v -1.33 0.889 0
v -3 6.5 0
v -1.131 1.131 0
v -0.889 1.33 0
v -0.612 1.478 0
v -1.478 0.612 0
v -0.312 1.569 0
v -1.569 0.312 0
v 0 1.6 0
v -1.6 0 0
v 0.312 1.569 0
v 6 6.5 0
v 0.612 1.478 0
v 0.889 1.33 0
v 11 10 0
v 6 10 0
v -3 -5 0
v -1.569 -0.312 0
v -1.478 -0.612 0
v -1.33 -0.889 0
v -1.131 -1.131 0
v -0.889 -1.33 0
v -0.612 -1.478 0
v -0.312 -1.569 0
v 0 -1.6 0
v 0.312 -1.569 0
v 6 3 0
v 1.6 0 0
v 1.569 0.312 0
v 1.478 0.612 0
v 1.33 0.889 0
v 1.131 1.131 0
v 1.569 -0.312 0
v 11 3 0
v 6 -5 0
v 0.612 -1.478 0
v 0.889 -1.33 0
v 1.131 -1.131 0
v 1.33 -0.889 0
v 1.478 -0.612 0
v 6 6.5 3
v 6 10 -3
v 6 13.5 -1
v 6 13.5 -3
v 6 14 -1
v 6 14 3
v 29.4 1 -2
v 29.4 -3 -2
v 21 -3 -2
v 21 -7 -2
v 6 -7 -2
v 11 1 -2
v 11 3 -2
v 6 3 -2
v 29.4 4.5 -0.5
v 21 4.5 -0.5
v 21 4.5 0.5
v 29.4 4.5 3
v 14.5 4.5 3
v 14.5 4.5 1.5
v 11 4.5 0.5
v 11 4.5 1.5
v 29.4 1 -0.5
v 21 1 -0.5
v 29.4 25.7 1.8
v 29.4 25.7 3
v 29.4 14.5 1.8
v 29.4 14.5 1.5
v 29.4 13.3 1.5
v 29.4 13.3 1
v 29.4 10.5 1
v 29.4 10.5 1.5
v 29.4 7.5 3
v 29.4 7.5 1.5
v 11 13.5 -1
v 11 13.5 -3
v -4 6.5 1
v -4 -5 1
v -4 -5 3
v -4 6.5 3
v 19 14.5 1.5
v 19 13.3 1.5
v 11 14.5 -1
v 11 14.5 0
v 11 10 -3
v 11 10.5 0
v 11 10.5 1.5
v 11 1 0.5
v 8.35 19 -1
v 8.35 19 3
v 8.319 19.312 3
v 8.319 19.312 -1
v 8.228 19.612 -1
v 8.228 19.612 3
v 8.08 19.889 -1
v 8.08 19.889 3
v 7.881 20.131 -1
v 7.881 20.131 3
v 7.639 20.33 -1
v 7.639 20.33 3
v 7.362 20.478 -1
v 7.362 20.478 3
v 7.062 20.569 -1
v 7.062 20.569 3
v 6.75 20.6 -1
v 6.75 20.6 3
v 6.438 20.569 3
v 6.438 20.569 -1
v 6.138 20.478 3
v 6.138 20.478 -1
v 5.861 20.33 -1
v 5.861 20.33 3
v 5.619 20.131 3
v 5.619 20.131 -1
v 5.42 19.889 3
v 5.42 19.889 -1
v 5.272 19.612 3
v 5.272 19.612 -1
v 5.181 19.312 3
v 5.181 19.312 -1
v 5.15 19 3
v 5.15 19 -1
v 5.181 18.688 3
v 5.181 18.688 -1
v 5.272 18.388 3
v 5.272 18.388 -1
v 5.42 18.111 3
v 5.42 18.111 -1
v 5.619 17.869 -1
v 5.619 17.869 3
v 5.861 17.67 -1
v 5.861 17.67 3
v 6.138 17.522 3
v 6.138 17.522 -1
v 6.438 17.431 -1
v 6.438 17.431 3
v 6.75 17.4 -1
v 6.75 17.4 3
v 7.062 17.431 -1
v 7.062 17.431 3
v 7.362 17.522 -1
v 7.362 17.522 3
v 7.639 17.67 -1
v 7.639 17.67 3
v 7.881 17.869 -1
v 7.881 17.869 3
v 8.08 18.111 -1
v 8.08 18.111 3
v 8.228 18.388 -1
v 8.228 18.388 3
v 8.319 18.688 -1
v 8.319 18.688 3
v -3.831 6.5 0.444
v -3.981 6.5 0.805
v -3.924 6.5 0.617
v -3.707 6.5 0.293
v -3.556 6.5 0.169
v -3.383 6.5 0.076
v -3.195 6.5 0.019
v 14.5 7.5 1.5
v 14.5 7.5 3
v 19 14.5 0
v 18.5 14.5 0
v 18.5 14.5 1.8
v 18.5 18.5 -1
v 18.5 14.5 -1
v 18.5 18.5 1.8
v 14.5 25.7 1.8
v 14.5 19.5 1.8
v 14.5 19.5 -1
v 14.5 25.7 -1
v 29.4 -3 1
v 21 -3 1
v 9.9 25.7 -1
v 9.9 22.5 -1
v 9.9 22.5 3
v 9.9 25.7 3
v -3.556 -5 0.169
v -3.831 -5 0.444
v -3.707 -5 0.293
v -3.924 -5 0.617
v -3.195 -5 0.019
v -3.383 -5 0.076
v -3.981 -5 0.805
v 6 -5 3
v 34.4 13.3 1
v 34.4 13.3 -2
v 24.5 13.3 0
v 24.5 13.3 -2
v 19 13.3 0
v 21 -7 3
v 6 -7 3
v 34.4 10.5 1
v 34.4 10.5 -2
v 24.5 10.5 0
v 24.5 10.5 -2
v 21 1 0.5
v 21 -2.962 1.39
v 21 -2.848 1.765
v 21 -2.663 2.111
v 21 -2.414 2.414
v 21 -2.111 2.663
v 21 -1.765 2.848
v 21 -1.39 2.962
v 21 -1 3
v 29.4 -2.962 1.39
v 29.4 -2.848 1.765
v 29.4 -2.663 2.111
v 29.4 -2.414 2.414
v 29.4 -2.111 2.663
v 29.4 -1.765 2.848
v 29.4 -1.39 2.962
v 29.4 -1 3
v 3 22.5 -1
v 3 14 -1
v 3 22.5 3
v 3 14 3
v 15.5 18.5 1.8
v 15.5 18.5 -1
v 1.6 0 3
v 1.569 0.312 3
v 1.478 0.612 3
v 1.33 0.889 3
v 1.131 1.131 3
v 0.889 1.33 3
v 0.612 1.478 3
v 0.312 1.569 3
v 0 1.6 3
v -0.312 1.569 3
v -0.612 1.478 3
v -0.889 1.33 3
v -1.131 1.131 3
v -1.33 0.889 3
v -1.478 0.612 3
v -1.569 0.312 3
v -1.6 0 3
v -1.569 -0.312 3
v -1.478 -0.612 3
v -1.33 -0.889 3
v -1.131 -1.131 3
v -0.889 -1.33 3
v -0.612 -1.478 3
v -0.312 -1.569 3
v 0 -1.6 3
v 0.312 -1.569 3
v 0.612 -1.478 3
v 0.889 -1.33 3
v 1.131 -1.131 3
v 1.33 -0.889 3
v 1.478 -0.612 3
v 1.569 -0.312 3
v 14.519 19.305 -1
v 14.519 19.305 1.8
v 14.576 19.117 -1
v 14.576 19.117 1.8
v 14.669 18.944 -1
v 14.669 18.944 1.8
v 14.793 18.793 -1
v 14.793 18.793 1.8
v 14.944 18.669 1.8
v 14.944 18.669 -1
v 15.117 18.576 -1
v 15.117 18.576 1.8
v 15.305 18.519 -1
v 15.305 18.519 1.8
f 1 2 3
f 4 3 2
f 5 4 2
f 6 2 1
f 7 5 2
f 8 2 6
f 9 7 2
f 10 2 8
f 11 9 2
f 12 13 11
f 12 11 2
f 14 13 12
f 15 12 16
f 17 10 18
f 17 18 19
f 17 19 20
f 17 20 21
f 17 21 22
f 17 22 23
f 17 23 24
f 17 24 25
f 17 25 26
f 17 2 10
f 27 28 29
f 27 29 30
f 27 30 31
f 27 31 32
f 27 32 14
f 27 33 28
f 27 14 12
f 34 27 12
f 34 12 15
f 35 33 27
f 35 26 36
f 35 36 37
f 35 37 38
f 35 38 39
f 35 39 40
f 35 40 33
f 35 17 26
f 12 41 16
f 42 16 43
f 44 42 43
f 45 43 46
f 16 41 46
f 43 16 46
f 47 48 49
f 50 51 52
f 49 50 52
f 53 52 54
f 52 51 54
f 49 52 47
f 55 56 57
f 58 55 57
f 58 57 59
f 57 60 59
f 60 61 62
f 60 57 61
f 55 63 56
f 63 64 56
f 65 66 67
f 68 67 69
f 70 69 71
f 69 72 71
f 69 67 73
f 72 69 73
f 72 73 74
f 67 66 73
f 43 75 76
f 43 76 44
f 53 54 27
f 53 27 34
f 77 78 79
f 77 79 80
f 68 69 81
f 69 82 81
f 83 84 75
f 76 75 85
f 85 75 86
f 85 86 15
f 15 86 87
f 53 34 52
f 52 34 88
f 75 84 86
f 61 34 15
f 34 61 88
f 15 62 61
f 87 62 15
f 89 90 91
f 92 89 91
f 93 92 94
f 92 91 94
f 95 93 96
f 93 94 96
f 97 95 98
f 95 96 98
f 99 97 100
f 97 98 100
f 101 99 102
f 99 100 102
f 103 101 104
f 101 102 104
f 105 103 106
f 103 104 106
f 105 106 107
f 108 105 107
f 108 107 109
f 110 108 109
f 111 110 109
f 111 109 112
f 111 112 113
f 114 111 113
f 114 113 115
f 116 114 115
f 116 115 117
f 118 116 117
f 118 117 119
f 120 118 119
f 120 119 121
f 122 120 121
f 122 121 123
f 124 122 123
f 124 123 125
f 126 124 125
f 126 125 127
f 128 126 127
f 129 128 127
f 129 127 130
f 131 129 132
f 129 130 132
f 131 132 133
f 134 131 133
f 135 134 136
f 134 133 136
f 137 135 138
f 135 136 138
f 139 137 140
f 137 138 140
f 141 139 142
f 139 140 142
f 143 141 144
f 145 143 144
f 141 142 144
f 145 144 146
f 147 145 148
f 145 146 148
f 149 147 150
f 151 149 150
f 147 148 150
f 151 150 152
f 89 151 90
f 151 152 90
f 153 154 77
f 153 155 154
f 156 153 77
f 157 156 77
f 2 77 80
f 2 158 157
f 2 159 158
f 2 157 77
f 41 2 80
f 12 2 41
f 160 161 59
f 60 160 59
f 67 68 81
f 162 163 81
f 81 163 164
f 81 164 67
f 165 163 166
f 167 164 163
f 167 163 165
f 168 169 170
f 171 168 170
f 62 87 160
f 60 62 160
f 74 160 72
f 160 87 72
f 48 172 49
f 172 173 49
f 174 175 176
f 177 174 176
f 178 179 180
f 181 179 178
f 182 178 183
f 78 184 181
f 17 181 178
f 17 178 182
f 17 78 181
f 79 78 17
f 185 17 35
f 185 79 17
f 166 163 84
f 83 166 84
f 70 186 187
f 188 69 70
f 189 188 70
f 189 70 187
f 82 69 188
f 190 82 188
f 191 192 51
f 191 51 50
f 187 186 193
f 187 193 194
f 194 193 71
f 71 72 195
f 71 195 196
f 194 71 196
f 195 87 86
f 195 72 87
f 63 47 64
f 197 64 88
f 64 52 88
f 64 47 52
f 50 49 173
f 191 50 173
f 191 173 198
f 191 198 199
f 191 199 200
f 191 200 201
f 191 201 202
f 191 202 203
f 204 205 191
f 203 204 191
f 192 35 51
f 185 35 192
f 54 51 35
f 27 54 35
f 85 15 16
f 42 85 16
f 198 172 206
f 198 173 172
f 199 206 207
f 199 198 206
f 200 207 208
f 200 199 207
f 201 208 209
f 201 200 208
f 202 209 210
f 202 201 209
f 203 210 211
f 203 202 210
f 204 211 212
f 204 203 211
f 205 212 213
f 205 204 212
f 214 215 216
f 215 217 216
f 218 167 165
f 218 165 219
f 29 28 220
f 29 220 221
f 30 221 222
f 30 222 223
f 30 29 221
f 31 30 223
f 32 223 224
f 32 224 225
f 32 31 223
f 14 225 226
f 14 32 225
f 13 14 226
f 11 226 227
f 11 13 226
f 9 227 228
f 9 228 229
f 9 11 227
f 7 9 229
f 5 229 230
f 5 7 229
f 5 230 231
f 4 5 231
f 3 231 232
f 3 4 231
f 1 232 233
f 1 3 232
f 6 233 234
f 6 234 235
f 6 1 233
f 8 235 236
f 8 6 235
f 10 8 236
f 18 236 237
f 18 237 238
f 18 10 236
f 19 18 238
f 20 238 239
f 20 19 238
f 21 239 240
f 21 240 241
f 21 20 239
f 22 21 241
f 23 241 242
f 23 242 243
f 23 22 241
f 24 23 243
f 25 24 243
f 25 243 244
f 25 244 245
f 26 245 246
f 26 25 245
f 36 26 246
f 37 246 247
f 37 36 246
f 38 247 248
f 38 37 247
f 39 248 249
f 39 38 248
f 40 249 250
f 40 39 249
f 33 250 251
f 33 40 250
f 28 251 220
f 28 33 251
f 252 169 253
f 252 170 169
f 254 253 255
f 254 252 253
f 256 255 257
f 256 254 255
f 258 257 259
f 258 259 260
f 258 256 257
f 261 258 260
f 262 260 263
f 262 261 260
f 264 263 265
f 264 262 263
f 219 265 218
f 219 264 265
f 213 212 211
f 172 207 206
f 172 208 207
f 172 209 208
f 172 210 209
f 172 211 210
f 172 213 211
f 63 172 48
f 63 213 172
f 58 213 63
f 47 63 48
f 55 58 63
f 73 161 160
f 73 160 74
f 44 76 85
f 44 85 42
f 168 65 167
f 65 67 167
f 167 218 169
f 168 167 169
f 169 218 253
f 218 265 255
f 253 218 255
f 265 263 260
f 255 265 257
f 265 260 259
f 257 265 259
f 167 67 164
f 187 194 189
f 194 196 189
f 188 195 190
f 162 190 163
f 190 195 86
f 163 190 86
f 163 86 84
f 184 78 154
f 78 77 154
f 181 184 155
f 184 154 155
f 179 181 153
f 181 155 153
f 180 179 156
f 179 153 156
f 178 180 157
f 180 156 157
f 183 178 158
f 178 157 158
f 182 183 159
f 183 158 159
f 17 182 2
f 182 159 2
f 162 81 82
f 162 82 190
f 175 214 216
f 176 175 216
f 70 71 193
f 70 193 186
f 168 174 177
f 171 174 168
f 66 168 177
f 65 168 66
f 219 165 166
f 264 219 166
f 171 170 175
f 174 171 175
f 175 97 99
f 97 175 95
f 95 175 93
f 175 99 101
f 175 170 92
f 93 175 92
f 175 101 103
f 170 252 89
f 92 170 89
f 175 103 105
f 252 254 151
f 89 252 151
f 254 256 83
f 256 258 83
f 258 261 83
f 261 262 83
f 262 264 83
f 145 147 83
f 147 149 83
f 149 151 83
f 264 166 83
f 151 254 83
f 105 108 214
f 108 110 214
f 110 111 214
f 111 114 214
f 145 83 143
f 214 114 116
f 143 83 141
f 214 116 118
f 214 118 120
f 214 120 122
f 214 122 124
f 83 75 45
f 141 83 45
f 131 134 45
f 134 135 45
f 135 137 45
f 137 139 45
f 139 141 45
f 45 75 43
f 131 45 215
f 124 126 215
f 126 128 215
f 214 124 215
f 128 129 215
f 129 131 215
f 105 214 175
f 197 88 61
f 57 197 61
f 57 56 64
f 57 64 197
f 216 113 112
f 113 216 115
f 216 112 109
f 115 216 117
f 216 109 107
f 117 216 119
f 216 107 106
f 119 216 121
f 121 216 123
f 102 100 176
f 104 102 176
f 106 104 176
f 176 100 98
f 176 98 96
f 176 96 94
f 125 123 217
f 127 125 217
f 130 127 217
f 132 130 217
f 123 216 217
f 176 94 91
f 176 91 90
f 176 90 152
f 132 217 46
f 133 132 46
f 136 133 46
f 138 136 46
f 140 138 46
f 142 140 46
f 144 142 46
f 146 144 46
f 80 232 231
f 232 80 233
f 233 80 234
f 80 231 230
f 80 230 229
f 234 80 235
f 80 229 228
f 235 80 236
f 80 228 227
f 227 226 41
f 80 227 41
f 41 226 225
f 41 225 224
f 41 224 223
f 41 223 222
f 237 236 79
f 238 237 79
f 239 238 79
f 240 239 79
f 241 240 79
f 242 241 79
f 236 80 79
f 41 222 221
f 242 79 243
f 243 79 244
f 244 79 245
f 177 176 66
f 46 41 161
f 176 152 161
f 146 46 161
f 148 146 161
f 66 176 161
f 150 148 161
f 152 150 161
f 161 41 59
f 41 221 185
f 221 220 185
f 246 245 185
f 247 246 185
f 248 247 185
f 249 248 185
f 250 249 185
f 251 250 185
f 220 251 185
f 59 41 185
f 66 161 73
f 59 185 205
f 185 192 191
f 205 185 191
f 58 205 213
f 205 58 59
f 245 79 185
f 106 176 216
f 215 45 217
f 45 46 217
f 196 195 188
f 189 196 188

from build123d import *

# Parameters (mm, degrees)
SKETCH_1_W          = 10
SKETCH_1_H          = 11.5
SKETCH_1_R          = 1.6
EXTRUDE_1_DEPTH     = 3
SKETCH_2_W          = 15
SKETCH_2_H          = 6
EXTRUDE_2_DEPTH     = 5
FILLET_1_R          = 1
SKETCH_3_W          = 5
SKETCH_3_H          = 5
EXTRUDE_3_DEPTH     = 2
SKETCH_4_W          = 5
SKETCH_4_H          = 3
EXTRUDE_4_DEPTH     = 19.5
SKETCH_5_W          = 5
SKETCH_5_H          = 3.5
EXTRUDE_5_DEPTH     = 3
SKETCH_6_W          = 3
SKETCH_6_H          = 8.5
EXTRUDE_6_DEPTH     = 3
EXTRUDE_7_DEPTH     = 1
SKETCH_8_W          = 3.5
SKETCH_8_H          = 21.5
EXTRUDE_8_DEPTH     = 1
SKETCH_9_W          = 3
SKETCH_9_H          = 8
EXTRUDE_9_DEPTH     = 3.5
EXTRUDE_10_REACH    = 29.208
SKETCH_10_W         = 2.5
SKETCH_10_H         = 3.5
EXTRUDE_11_REACH    = 29.208
SKETCH_11_W         = 3
SKETCH_11_H         = 4
SKETCH_12_W         = 1.5
SKETCH_12_H         = 1.2
CUT_EXTRUDE_1_DEPTH = 2
SKETCH_13_W         = 1
SKETCH_13_H         = 2.5
EXTRUDE_12_DEPTH    = 6.5
SKETCH_14_W         = 1.2
SKETCH_14_H         = 8
EXTRUDE_13_DEPTH    = 6.5
SKETCH_15_W         = 4
SKETCH_15_H         = 4
EXTRUDE_14_DEPTH    = 2.8
FILLET_2_R          = 1
CUT_EXTRUDE_2_REACH = 33.357
SKETCH_16_R         = 1.6
SKETCH_17_W         = 15
SKETCH_17_H         = 5
EXTRUDE_15_DEPTH    = 2
EXTRUDE_16_DEPTH    = 5.5
SKETCH_19_W         = 2
SKETCH_19_H         = 2.8
EXTRUDE_17_DEPTH    = 2
EXTRUDE_18_DEPTH    = 5.5
EXTRUDE_19_DEPTH    = 2.9
EXTRUDE_20_DEPTH    = 0.5
FILLET_3_R          = 2
SKETCH_23_W         = 14.9
SKETCH_23_H         = 1.5
EXTRUDE_21_DEPTH    = 0.5
SKETCH_24_W         = 3
SKETCH_24_H         = 2.8
EXTRUDE_22_DEPTH    = 5
EXTRUDE_23_DEPTH    = 3.2


with BuildPart() as part:
    # 草图1 → 凸台-拉伸1 (new body)
    with BuildSketch(Plane.XY):
        with Locations((1, 0.75)):
            Rectangle(SKETCH_1_W, SKETCH_1_H)
        Circle(SKETCH_1_R, mode=Mode.SUBTRACT)
    extrude(amount=EXTRUDE_1_DEPTH)

    # 草图2 → 凸台-拉伸2 (add)
    with BuildSketch(Plane.XY.offset(3)):
        with Locations((13.5, -2)):
            Rectangle(SKETCH_2_W, SKETCH_2_H)
    extrude(amount=-EXTRUDE_2_DEPTH)

    # 圆角1
    fillet_1_edges = [part.edges().sort_by_distance(p)[0] for p in [
        (-4, 0.75, 0),
    ]]
    fillet(fillet_1_edges, radius=FILLET_1_R)

    # 草图3 → 凸台-拉伸3 (add)
    with BuildSketch(Plane(origin=(0, 1, 0), x_dir=(1, 0, 0), z_dir=(0, 1, 0))):
        with Locations((8.5, -0.5)):
            Rectangle(SKETCH_3_W, SKETCH_3_H)
    extrude(amount=EXTRUDE_3_DEPTH)

    # 草图4 → 凸台-拉伸4 (add)
    with BuildSketch(Plane(origin=(0, 3, 0), x_dir=(1, 0, 0), z_dir=(0, 1, 0))):
        with Locations((8.5, -1.5)):
            Rectangle(SKETCH_4_W, SKETCH_4_H)
    extrude(amount=EXTRUDE_4_DEPTH)

    # 草图5 → 凸台-拉伸5 (add)
    with BuildSketch(Plane(origin=(0, 0, 0), x_dir=(-1, 0, 0), z_dir=(0, 0, -1))):
        with Locations((-8.5, 11.75)):
            Rectangle(SKETCH_5_W, SKETCH_5_H)
    extrude(amount=EXTRUDE_5_DEPTH)

    # 草图6 → 凸台-拉伸6 (add)
    with BuildSketch(Plane.ZY.offset(-6)):
        with Locations((1.5, 18.25)):
            Rectangle(SKETCH_6_W, SKETCH_6_H)
    extrude(amount=EXTRUDE_6_DEPTH)

    # 草图7 → 凸台-拉伸7 (add)
    with BuildSketch(Plane(origin=(0, 0, 0), x_dir=(-1, 0, 0), z_dir=(0, 0, -1))):
        Polygon((-11, 13.5), (-6, 13.5), (-6, 14), (-3, 14), (-3, 22.5), (-11, 22.5), align=None)
    extrude(amount=EXTRUDE_7_DEPTH)

    # 草图8 → 凸台-拉伸8 (add)
    with BuildSketch(Plane.XY.offset(3)):
        with Locations((12.75, 11.75)):
            Rectangle(SKETCH_8_W, SKETCH_8_H)
    extrude(amount=-EXTRUDE_8_DEPTH)

    # 草图9 → 凸台-拉伸9 (add)
    with BuildSketch(Plane(origin=(11, 0, 0), x_dir=(0, 0, -1), z_dir=(1, 0, 0))):
        with Locations((-0.5, 18.5)):
            Rectangle(SKETCH_9_W, SKETCH_9_H)
    extrude(amount=EXTRUDE_9_DEPTH)

    # 凸台-拉伸10: up to this face of the body (flat: up to its plane)
    extrude_10_end = Plane(part.part.faces().sort_by_distance((21, -2, 0.5))[0])
    # 草图10 → 凸台-拉伸10 (add, up to the picked face)
    with BuildSketch(Plane(origin=(11, 0, 0), x_dir=(0, 0, -1), z_dir=(1, 0, 0)), mode=Mode.PRIVATE) as extrude_10_sk1:
        with Locations((-1.75, 2.75)):
            Rectangle(SKETCH_10_W, SKETCH_10_H)
    extrude_10_tool1 = split(extrude(extrude_10_sk1.sketch, amount=EXTRUDE_10_REACH, mode=Mode.PRIVATE), bisect_by=extrude_10_end, keep=Keep.BOTH, mode=Mode.PRIVATE)
    add(extrude_10_tool1.solids().sort_by(Axis((11, 2.75, 1.75), (1, 0, 0)))[0])

    # 凸台-拉伸11: up to this face of the body (flat: up to its plane)
    extrude_11_end = Plane(part.part.faces().sort_by_distance((21, -0.927419355, 0.782258065))[0])
    # 草图11 → 凸台-拉伸11 (add, up to the picked face)
    with BuildSketch(Plane(origin=(11, 0, 0), x_dir=(0, 0, -1), z_dir=(1, 0, 0)), mode=Mode.PRIVATE) as extrude_11_sk1:
        with Locations((-1.5, 12.5)):
            Rectangle(SKETCH_11_W, SKETCH_11_H)
    extrude_11_tool1 = split(extrude(extrude_11_sk1.sketch, amount=EXTRUDE_11_REACH, mode=Mode.PRIVATE), bisect_by=extrude_11_end, keep=Keep.BOTH, mode=Mode.PRIVATE)
    add(extrude_11_tool1.solids().sort_by(Axis((11, 12.5, 1.5), (1, 0, 0)))[0])

    # 草图12 → 切除-拉伸1 (cut)
    with BuildSketch(Plane(origin=(21, 0, 0), x_dir=(0, 0, -1), z_dir=(1, 0, 0))):
        with Locations((-0.75, 13.9)):
            Rectangle(SKETCH_12_W, SKETCH_12_H)
    extrude(amount=-CUT_EXTRUDE_1_DEPTH, mode=Mode.SUBTRACT)

    # 草图13 → 凸台-拉伸12 (add)
    with BuildSketch(Plane(origin=(14.5, 0, 0), x_dir=(0, 0, -1), z_dir=(1, 0, 0))):
        with Locations((-2.5, 9.25)):
            Rectangle(SKETCH_13_W, SKETCH_13_H)
    extrude(amount=EXTRUDE_12_DEPTH)

    # 草图14 → 凸台-拉伸13 (add)
    with BuildSketch(Plane(origin=(14.5, 0, 0), x_dir=(0, 0, -1), z_dir=(1, 0, 0))):
        with Locations((-2.4, 18.5)):
            Rectangle(SKETCH_14_W, SKETCH_14_H)
    extrude(amount=EXTRUDE_13_DEPTH)

    # 草图15 → 凸台-拉伸14 (add)
    with BuildSketch(Plane(origin=(0, 0, 1.8), x_dir=(-1, 0, 0), z_dir=(0, 0, -1))):
        with Locations((-16.5, 16.5)):
            Rectangle(SKETCH_15_W, SKETCH_15_H)
    extrude(amount=EXTRUDE_14_DEPTH)

    # 圆角2
    fillet_2_edges = [part.edges().sort_by_distance(p)[0] for p in [
        (14.5, 18.5, 0.4),
    ]]
    fillet(fillet_2_edges, radius=FILLET_2_R)

    # 草图16 → 切除-拉伸2 (cut, up to next)
    with BuildSketch(Plane.XY.offset(3), mode=Mode.PRIVATE) as cut_extrude_2_sk1:
        with Locations((6.75, 19)):
            Circle(SKETCH_16_R)
    cut_extrude_2_tool1 = extrude(cut_extrude_2_sk1.sketch, amount=-CUT_EXTRUDE_2_REACH, mode=Mode.PRIVATE) & part.part
    add(cut_extrude_2_tool1.solids().sort_by_distance((6.75, 19, 3))[0], mode=Mode.SUBTRACT)

    # 草图17 → 凸台-拉伸15 (add)
    with BuildSketch(Plane.XZ.offset(5)):
        with Locations((13.5, 0.5)):
            Rectangle(SKETCH_17_W, SKETCH_17_H)
    extrude(amount=EXTRUDE_15_DEPTH)

    # 草图18 → 凸台-拉伸16 (add)
    with BuildSketch(Plane(origin=(21, 0, 0), x_dir=(0, 0, -1), z_dir=(1, 0, 0))):
        Polygon((0, 13.3), (-1.5, 13.3), (-1.5, 14.5), (-1.8, 14.5), (-1.8, 22.5), (-3, 22.5), (-3, 8), (-2, 8), (-2, 10.5), (0, 10.5), align=None)
    extrude(amount=EXTRUDE_16_DEPTH)

    # 草图19 → 凸台-拉伸17 (add)
    with BuildSketch(Plane(origin=(0, 0, 0), x_dir=(-1, 0, 0), z_dir=(0, 0, -1))):
        with Locations((-25.5, 11.9)):
            Rectangle(SKETCH_19_W, SKETCH_19_H)
    extrude(amount=EXTRUDE_17_DEPTH)

    # 草图20 → 凸台-拉伸18 (add)
    with BuildSketch(Plane(origin=(21, 0, 0), x_dir=(0, 0, -1), z_dir=(1, 0, 0))):
        Polygon((0.5, -3), (-3, -3), (-3, 4.5), (0.5, 4.5), (0.5, 1), (2, 1), (2, -3), align=None)
    extrude(amount=EXTRUDE_18_DEPTH)

    # 草图21 → 凸台-拉伸19 (add)
    with BuildSketch(Plane(origin=(26.5, 0, 0), x_dir=(0, 0, -1), z_dir=(1, 0, 0))):
        Polygon((-3, -3), (2, -3), (2, 1), (0.5, 1), (0.5, 4.5), (-3, 4.5), align=None)
        Polygon((-2, 10.5), (2, 10.5), (2, 13.3), (-1.5, 13.3), (-1.5, 14.5), (-1.8, 14.5), (-1.8, 22.5), (-3, 22.5), (-3, 8), (-2, 8), align=None)
    extrude(amount=EXTRUDE_19_DEPTH)

    # 草图22 → 凸台-拉伸20 (add)
    with BuildSketch(Plane(origin=(0, 0, 2), x_dir=(-1, 0, 0), z_dir=(0, 0, -1))):
        Polygon((-11, 10.5), (-29.4, 10.5), (-29.4, 8), (-14.5, 8), (-14.5, 4.5), (-11, 4.5), align=None)
    extrude(amount=EXTRUDE_20_DEPTH)

    # 圆角3
    fillet_3_edges = [part.edges().sort_by_distance(p)[0] for p in [
        (25.2, -3, 3),
    ]]
    fillet(fillet_3_edges, radius=FILLET_3_R)

    # 草图23 → 凸台-拉伸21 (add)
    with BuildSketch(Plane.XZ.offset(-8)):
        with Locations((21.95, 2.25)):
            Rectangle(SKETCH_23_W, SKETCH_23_H)
    extrude(amount=EXTRUDE_21_DEPTH)

    # 草图24 → 凸台-拉伸22 (add)
    with BuildSketch(Plane(origin=(29.4, 0, 0), x_dir=(0, 0, -1), z_dir=(1, 0, 0))):
        with Locations((0.5, 11.9)):
            Rectangle(SKETCH_24_W, SKETCH_24_H)
    extrude(amount=EXTRUDE_22_DEPTH)

    # 草图25 → 凸台-拉伸23 (add)
    with BuildSketch(Plane(origin=(0, 22.5, 0), x_dir=(1, 0, 0), z_dir=(0, 1, 0))):
        Polygon((9.9, 1), (9.9, -3), (29.4, -3), (29.4, -1.8), (14.5, -1.8), (14.5, 1), align=None)
    extrude(amount=EXTRUDE_23_DEPTH)


solid = part.part
